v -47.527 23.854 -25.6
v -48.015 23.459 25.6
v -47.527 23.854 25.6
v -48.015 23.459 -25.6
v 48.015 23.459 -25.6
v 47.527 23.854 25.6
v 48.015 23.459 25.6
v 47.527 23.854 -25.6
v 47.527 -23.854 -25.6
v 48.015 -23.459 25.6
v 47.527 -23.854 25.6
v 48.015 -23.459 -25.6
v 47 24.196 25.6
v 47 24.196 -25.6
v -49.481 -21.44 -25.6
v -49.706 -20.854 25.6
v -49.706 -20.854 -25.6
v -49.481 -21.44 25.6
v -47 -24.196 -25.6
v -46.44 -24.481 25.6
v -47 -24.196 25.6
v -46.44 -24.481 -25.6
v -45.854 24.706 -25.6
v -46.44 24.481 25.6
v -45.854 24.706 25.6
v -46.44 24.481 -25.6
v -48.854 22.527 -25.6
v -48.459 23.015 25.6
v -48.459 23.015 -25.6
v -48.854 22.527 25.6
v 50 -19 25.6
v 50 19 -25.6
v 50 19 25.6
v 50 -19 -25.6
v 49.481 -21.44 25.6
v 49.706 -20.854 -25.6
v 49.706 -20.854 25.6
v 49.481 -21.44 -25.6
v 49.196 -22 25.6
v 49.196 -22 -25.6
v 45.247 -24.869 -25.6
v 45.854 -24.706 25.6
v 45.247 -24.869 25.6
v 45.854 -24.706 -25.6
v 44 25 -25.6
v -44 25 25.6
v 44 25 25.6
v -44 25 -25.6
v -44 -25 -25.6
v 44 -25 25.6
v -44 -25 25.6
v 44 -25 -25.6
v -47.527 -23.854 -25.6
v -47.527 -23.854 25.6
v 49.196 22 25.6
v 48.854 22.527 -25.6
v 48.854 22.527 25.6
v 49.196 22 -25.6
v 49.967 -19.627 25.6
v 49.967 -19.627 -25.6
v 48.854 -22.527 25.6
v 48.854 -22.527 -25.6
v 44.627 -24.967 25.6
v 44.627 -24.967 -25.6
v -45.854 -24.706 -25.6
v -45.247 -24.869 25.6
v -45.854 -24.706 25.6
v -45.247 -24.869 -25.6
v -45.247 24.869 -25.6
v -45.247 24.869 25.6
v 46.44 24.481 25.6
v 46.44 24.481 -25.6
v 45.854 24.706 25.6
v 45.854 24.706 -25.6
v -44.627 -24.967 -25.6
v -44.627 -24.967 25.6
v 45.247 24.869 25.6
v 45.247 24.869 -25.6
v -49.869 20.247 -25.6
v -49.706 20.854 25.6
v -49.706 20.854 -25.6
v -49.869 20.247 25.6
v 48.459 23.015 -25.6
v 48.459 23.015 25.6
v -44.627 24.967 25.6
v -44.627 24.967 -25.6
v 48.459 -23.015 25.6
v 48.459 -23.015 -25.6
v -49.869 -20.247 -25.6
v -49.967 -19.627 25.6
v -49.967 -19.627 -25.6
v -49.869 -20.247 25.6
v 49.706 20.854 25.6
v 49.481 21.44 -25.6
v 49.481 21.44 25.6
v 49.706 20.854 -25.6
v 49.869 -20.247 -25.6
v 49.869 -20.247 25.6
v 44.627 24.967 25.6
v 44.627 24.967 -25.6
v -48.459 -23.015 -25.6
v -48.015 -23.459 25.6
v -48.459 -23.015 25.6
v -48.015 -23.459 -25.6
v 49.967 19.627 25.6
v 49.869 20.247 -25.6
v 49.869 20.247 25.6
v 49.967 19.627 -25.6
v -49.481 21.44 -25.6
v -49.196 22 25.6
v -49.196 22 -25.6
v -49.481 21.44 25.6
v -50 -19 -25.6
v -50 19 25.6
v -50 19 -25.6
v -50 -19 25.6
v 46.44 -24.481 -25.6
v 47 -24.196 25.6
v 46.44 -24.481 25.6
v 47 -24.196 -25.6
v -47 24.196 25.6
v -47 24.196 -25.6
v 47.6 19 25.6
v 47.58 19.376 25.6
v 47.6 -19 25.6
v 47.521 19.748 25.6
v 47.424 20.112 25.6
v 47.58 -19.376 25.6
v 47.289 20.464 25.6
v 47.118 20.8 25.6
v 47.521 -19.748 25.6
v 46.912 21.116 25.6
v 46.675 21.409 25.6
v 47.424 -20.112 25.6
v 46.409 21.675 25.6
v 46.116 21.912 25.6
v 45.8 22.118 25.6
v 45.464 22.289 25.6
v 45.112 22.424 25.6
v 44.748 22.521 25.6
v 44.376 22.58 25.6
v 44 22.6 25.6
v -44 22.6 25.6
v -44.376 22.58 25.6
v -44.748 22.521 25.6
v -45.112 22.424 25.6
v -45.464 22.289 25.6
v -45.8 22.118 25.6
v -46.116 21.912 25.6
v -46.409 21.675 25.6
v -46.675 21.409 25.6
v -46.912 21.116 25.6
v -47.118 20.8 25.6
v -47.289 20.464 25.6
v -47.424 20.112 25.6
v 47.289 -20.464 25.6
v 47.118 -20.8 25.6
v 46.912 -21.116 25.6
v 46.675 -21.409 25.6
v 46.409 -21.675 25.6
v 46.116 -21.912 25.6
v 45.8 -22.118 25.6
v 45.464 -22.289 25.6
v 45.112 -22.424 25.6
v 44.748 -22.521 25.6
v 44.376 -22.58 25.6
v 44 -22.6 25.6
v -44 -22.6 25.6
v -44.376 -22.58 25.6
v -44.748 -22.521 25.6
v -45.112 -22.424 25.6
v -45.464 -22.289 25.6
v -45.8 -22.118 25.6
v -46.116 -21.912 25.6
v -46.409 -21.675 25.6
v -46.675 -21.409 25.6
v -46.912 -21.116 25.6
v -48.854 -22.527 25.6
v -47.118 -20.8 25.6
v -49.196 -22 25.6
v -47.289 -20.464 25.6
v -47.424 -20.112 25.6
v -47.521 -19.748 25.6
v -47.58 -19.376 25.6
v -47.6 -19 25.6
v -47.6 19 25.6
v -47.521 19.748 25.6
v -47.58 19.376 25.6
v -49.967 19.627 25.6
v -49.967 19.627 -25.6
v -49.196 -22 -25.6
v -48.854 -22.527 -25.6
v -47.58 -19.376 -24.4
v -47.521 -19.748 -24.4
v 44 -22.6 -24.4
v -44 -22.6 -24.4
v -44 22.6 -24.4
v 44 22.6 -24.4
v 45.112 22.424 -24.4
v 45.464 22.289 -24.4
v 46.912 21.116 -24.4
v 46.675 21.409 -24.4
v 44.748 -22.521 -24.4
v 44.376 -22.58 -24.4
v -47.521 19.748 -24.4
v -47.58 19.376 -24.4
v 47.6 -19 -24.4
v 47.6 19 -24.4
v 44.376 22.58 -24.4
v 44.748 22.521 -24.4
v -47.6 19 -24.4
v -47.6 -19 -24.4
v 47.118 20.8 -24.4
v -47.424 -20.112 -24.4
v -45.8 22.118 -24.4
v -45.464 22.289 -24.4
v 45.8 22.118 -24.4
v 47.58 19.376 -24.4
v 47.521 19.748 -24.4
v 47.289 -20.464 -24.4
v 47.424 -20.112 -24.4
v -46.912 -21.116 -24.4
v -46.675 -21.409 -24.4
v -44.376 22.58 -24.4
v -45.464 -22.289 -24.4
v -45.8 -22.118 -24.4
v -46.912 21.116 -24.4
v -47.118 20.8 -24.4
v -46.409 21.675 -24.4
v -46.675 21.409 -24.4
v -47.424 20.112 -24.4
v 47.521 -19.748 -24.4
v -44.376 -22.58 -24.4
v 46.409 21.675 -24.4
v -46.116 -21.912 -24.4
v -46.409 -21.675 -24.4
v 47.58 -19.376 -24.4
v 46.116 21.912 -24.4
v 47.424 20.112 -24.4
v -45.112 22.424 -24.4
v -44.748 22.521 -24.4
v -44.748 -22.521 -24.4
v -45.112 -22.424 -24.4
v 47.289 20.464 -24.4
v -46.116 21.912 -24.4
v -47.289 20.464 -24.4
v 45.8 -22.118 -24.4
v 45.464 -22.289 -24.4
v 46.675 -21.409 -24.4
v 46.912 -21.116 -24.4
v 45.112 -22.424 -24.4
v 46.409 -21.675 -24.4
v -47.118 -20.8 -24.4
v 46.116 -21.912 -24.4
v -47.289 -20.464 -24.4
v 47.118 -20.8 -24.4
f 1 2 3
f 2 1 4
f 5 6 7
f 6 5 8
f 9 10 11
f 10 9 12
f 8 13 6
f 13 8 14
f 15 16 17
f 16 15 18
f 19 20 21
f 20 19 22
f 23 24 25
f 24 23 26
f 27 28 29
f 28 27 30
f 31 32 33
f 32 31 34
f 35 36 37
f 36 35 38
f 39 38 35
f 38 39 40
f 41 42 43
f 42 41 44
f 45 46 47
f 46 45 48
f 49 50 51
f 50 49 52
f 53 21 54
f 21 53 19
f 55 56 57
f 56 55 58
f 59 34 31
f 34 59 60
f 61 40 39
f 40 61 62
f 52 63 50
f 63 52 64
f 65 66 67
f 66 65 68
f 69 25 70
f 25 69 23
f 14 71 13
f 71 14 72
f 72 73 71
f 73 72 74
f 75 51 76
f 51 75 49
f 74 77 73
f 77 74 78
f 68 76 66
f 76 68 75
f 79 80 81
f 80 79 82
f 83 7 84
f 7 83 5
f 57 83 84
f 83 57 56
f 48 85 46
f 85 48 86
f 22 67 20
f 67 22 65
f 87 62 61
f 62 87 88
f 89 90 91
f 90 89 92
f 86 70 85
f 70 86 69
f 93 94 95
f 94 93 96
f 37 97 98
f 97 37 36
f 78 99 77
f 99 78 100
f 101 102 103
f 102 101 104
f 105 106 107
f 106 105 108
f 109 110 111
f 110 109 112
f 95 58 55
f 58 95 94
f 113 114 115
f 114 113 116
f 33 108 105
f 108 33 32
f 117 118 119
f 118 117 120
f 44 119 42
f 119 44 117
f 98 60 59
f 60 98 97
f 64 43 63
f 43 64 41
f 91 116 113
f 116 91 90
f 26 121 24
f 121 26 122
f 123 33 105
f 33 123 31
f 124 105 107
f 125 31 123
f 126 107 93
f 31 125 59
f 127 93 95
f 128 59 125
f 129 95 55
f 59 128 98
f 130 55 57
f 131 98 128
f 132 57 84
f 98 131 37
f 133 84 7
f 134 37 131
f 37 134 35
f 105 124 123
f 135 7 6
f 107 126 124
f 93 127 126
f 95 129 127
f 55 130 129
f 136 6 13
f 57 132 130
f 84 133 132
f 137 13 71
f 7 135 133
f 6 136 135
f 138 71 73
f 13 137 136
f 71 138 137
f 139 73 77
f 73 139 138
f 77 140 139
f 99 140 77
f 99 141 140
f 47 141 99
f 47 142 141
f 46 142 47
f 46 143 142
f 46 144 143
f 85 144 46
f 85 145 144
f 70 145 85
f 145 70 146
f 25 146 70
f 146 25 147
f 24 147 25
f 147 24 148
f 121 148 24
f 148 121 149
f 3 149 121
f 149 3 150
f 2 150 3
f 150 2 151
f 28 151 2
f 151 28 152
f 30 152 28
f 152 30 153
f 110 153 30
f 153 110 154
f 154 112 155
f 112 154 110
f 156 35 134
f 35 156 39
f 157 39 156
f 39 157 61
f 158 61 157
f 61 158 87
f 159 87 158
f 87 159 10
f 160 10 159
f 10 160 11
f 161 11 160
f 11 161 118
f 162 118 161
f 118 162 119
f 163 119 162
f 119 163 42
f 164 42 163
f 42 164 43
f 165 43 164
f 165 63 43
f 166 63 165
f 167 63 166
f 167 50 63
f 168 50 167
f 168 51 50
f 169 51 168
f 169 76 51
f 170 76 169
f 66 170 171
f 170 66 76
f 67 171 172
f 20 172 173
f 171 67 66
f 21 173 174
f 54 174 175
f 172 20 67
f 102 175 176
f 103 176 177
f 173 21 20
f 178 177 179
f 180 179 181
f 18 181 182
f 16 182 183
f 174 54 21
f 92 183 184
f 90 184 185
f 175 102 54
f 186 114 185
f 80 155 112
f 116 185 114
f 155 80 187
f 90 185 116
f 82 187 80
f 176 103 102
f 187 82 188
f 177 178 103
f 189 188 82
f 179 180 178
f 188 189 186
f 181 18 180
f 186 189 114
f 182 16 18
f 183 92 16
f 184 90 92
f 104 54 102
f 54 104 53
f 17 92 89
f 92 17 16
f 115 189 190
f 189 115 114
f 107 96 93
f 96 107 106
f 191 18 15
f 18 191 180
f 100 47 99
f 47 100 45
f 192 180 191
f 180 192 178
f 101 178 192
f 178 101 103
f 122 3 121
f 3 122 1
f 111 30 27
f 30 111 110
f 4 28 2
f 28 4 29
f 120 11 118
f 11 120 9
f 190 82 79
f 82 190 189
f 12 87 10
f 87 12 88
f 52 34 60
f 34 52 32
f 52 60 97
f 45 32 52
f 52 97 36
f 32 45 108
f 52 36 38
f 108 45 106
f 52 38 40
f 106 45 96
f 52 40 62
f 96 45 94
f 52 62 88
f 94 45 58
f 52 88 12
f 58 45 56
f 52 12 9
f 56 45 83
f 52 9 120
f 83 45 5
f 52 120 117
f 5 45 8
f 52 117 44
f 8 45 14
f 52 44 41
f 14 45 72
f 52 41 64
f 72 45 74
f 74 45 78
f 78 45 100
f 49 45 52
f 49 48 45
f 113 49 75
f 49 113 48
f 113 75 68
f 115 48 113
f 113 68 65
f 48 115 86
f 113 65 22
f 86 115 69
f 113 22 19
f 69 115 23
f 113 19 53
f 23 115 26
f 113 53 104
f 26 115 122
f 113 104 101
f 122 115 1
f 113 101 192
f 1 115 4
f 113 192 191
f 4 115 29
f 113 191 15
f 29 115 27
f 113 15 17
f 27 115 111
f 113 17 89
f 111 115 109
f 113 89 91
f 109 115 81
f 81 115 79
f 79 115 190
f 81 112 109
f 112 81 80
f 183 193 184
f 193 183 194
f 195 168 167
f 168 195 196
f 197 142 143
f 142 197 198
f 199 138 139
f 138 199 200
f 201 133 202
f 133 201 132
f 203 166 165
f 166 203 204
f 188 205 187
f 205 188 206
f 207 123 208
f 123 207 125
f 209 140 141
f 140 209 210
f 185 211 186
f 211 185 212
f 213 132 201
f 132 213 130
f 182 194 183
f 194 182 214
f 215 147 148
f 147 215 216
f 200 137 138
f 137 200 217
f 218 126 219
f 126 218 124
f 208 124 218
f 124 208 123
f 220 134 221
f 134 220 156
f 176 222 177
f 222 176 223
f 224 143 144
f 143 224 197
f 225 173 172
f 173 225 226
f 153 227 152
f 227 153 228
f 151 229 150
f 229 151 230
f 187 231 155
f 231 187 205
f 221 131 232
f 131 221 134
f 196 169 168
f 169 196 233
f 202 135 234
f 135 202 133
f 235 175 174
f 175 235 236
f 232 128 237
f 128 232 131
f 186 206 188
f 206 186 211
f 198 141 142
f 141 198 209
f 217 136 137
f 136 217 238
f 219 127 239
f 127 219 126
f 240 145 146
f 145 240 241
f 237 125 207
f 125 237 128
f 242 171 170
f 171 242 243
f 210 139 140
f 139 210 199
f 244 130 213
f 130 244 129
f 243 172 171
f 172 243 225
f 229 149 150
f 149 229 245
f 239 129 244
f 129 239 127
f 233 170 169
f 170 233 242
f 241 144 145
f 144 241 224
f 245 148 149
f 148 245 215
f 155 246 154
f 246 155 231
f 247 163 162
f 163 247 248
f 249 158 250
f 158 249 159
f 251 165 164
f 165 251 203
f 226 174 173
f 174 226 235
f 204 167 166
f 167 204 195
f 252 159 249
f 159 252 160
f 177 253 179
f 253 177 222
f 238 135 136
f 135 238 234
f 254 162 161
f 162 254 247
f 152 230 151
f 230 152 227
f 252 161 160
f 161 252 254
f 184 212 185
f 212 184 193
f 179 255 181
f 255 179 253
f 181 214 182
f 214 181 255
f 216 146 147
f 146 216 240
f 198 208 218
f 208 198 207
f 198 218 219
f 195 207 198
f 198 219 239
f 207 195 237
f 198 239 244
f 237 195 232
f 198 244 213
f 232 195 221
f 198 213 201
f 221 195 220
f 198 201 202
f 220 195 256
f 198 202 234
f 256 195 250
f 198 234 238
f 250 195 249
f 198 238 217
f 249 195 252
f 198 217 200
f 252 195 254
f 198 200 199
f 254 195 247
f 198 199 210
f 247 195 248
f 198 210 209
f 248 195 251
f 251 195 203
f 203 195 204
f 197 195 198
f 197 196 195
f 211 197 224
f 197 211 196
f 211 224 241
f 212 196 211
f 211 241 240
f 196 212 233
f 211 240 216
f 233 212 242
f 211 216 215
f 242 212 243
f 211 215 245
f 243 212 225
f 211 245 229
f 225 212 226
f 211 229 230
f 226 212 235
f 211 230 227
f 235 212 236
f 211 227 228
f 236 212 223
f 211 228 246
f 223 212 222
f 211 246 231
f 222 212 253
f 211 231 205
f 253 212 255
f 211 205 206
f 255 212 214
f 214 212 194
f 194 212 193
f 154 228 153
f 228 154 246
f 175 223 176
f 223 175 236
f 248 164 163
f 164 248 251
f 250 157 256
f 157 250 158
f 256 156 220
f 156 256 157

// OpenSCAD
width = 100;
depth = 50;
height = 50;
wall = 1.2;
rad = 6;
mldw = width-rad*2;
mldd = depth-rad*2;

module bottom(W,D,R)
{
    minkowski() {
        cube([W,D,height], center=true);
        cylinder(r=R,h=wall, center=true, $fn=60);
    }
}

difference() {
    bottom(mldw,mldd,rad);
    translate([0,0,wall])bottom(mldw,mldd,rad-wall*2);
}
